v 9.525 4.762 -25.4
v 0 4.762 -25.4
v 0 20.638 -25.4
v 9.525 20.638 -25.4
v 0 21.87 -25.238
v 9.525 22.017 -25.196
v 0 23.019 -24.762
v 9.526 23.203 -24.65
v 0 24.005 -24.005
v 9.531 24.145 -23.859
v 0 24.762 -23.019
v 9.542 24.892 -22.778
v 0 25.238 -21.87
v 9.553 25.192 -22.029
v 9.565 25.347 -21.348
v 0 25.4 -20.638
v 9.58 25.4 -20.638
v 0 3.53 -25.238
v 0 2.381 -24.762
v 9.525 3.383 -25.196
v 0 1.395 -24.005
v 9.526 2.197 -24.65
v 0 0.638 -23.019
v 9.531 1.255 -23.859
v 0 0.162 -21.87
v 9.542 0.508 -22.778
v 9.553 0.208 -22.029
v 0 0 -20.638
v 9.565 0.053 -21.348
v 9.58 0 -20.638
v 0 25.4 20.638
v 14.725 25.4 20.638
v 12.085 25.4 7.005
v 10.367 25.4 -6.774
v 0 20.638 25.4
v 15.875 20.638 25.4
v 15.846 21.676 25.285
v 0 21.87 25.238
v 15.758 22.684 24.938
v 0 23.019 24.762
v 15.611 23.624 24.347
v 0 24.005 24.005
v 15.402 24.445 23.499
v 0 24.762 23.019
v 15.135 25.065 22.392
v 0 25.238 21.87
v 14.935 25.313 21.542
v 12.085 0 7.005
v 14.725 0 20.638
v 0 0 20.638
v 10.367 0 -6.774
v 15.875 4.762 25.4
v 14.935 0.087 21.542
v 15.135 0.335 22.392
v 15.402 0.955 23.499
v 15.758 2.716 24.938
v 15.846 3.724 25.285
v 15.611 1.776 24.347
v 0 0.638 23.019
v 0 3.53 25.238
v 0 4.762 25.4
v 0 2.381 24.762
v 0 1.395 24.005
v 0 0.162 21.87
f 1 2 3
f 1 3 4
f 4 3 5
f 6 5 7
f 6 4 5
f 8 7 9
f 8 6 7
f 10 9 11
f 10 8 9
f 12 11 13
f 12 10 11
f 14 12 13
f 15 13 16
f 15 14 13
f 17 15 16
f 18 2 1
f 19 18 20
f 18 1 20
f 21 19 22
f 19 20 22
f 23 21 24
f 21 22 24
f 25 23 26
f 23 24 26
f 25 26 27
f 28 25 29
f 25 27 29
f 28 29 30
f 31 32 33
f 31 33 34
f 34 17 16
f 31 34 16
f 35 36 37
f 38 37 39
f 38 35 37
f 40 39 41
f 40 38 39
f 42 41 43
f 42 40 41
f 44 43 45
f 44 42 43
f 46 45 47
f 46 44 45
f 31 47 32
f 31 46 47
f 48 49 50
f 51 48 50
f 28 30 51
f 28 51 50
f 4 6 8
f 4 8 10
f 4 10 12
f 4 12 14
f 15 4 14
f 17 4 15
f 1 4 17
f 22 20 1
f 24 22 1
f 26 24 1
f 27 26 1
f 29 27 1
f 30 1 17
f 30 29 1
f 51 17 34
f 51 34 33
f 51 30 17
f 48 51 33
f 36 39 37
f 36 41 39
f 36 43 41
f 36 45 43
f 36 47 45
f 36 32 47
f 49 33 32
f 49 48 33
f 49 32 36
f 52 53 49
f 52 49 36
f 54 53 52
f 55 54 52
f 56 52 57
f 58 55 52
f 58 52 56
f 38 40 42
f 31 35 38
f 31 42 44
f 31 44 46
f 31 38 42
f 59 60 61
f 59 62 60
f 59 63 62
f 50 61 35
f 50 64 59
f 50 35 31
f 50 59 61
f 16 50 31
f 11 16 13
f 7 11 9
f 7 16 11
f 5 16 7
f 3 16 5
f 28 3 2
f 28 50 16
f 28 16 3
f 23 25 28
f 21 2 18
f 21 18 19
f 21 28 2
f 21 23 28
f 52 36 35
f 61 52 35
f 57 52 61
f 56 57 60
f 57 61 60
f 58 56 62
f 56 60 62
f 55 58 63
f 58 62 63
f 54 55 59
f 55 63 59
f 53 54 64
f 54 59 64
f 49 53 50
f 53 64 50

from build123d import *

# Parameters (mm, degrees)
BOSS_EXTRUDE1_DEPTH = 25.4
FILLET1_R           = 4.7625


with BuildPart() as part:
    # Sketch1 → Boss-Extrude1 (new body)
    with BuildSketch(Plane(origin=(0, 0, 0), x_dir=(1, 0, 0), z_dir=(0, 1, 0))):
        with BuildLine():
            Line((0, -25.4), (0, 25.4))
            Line((0, 25.4), (9.525, 25.4))
            ThreePointArc((9.525, 25.4), (11.118653193, -0.197668351), (15.875, -25.4))
            Line((15.875, -25.4), (0, -25.4))
        make_face()
    extrude(amount=BOSS_EXTRUDE1_DEPTH)

    # Fillet1
    fillet1_edges = [part.edges().sort_by_distance(p)[0] for p in [
        (7.9375, 25.4, 25.4),
        (4.7625, 25.4, -25.4),
        (7.9375, 0, 25.4),
        (4.7625, 0, -25.4),
    ]]
    fillet(fillet1_edges, radius=FILLET1_R)


solid = part.part
